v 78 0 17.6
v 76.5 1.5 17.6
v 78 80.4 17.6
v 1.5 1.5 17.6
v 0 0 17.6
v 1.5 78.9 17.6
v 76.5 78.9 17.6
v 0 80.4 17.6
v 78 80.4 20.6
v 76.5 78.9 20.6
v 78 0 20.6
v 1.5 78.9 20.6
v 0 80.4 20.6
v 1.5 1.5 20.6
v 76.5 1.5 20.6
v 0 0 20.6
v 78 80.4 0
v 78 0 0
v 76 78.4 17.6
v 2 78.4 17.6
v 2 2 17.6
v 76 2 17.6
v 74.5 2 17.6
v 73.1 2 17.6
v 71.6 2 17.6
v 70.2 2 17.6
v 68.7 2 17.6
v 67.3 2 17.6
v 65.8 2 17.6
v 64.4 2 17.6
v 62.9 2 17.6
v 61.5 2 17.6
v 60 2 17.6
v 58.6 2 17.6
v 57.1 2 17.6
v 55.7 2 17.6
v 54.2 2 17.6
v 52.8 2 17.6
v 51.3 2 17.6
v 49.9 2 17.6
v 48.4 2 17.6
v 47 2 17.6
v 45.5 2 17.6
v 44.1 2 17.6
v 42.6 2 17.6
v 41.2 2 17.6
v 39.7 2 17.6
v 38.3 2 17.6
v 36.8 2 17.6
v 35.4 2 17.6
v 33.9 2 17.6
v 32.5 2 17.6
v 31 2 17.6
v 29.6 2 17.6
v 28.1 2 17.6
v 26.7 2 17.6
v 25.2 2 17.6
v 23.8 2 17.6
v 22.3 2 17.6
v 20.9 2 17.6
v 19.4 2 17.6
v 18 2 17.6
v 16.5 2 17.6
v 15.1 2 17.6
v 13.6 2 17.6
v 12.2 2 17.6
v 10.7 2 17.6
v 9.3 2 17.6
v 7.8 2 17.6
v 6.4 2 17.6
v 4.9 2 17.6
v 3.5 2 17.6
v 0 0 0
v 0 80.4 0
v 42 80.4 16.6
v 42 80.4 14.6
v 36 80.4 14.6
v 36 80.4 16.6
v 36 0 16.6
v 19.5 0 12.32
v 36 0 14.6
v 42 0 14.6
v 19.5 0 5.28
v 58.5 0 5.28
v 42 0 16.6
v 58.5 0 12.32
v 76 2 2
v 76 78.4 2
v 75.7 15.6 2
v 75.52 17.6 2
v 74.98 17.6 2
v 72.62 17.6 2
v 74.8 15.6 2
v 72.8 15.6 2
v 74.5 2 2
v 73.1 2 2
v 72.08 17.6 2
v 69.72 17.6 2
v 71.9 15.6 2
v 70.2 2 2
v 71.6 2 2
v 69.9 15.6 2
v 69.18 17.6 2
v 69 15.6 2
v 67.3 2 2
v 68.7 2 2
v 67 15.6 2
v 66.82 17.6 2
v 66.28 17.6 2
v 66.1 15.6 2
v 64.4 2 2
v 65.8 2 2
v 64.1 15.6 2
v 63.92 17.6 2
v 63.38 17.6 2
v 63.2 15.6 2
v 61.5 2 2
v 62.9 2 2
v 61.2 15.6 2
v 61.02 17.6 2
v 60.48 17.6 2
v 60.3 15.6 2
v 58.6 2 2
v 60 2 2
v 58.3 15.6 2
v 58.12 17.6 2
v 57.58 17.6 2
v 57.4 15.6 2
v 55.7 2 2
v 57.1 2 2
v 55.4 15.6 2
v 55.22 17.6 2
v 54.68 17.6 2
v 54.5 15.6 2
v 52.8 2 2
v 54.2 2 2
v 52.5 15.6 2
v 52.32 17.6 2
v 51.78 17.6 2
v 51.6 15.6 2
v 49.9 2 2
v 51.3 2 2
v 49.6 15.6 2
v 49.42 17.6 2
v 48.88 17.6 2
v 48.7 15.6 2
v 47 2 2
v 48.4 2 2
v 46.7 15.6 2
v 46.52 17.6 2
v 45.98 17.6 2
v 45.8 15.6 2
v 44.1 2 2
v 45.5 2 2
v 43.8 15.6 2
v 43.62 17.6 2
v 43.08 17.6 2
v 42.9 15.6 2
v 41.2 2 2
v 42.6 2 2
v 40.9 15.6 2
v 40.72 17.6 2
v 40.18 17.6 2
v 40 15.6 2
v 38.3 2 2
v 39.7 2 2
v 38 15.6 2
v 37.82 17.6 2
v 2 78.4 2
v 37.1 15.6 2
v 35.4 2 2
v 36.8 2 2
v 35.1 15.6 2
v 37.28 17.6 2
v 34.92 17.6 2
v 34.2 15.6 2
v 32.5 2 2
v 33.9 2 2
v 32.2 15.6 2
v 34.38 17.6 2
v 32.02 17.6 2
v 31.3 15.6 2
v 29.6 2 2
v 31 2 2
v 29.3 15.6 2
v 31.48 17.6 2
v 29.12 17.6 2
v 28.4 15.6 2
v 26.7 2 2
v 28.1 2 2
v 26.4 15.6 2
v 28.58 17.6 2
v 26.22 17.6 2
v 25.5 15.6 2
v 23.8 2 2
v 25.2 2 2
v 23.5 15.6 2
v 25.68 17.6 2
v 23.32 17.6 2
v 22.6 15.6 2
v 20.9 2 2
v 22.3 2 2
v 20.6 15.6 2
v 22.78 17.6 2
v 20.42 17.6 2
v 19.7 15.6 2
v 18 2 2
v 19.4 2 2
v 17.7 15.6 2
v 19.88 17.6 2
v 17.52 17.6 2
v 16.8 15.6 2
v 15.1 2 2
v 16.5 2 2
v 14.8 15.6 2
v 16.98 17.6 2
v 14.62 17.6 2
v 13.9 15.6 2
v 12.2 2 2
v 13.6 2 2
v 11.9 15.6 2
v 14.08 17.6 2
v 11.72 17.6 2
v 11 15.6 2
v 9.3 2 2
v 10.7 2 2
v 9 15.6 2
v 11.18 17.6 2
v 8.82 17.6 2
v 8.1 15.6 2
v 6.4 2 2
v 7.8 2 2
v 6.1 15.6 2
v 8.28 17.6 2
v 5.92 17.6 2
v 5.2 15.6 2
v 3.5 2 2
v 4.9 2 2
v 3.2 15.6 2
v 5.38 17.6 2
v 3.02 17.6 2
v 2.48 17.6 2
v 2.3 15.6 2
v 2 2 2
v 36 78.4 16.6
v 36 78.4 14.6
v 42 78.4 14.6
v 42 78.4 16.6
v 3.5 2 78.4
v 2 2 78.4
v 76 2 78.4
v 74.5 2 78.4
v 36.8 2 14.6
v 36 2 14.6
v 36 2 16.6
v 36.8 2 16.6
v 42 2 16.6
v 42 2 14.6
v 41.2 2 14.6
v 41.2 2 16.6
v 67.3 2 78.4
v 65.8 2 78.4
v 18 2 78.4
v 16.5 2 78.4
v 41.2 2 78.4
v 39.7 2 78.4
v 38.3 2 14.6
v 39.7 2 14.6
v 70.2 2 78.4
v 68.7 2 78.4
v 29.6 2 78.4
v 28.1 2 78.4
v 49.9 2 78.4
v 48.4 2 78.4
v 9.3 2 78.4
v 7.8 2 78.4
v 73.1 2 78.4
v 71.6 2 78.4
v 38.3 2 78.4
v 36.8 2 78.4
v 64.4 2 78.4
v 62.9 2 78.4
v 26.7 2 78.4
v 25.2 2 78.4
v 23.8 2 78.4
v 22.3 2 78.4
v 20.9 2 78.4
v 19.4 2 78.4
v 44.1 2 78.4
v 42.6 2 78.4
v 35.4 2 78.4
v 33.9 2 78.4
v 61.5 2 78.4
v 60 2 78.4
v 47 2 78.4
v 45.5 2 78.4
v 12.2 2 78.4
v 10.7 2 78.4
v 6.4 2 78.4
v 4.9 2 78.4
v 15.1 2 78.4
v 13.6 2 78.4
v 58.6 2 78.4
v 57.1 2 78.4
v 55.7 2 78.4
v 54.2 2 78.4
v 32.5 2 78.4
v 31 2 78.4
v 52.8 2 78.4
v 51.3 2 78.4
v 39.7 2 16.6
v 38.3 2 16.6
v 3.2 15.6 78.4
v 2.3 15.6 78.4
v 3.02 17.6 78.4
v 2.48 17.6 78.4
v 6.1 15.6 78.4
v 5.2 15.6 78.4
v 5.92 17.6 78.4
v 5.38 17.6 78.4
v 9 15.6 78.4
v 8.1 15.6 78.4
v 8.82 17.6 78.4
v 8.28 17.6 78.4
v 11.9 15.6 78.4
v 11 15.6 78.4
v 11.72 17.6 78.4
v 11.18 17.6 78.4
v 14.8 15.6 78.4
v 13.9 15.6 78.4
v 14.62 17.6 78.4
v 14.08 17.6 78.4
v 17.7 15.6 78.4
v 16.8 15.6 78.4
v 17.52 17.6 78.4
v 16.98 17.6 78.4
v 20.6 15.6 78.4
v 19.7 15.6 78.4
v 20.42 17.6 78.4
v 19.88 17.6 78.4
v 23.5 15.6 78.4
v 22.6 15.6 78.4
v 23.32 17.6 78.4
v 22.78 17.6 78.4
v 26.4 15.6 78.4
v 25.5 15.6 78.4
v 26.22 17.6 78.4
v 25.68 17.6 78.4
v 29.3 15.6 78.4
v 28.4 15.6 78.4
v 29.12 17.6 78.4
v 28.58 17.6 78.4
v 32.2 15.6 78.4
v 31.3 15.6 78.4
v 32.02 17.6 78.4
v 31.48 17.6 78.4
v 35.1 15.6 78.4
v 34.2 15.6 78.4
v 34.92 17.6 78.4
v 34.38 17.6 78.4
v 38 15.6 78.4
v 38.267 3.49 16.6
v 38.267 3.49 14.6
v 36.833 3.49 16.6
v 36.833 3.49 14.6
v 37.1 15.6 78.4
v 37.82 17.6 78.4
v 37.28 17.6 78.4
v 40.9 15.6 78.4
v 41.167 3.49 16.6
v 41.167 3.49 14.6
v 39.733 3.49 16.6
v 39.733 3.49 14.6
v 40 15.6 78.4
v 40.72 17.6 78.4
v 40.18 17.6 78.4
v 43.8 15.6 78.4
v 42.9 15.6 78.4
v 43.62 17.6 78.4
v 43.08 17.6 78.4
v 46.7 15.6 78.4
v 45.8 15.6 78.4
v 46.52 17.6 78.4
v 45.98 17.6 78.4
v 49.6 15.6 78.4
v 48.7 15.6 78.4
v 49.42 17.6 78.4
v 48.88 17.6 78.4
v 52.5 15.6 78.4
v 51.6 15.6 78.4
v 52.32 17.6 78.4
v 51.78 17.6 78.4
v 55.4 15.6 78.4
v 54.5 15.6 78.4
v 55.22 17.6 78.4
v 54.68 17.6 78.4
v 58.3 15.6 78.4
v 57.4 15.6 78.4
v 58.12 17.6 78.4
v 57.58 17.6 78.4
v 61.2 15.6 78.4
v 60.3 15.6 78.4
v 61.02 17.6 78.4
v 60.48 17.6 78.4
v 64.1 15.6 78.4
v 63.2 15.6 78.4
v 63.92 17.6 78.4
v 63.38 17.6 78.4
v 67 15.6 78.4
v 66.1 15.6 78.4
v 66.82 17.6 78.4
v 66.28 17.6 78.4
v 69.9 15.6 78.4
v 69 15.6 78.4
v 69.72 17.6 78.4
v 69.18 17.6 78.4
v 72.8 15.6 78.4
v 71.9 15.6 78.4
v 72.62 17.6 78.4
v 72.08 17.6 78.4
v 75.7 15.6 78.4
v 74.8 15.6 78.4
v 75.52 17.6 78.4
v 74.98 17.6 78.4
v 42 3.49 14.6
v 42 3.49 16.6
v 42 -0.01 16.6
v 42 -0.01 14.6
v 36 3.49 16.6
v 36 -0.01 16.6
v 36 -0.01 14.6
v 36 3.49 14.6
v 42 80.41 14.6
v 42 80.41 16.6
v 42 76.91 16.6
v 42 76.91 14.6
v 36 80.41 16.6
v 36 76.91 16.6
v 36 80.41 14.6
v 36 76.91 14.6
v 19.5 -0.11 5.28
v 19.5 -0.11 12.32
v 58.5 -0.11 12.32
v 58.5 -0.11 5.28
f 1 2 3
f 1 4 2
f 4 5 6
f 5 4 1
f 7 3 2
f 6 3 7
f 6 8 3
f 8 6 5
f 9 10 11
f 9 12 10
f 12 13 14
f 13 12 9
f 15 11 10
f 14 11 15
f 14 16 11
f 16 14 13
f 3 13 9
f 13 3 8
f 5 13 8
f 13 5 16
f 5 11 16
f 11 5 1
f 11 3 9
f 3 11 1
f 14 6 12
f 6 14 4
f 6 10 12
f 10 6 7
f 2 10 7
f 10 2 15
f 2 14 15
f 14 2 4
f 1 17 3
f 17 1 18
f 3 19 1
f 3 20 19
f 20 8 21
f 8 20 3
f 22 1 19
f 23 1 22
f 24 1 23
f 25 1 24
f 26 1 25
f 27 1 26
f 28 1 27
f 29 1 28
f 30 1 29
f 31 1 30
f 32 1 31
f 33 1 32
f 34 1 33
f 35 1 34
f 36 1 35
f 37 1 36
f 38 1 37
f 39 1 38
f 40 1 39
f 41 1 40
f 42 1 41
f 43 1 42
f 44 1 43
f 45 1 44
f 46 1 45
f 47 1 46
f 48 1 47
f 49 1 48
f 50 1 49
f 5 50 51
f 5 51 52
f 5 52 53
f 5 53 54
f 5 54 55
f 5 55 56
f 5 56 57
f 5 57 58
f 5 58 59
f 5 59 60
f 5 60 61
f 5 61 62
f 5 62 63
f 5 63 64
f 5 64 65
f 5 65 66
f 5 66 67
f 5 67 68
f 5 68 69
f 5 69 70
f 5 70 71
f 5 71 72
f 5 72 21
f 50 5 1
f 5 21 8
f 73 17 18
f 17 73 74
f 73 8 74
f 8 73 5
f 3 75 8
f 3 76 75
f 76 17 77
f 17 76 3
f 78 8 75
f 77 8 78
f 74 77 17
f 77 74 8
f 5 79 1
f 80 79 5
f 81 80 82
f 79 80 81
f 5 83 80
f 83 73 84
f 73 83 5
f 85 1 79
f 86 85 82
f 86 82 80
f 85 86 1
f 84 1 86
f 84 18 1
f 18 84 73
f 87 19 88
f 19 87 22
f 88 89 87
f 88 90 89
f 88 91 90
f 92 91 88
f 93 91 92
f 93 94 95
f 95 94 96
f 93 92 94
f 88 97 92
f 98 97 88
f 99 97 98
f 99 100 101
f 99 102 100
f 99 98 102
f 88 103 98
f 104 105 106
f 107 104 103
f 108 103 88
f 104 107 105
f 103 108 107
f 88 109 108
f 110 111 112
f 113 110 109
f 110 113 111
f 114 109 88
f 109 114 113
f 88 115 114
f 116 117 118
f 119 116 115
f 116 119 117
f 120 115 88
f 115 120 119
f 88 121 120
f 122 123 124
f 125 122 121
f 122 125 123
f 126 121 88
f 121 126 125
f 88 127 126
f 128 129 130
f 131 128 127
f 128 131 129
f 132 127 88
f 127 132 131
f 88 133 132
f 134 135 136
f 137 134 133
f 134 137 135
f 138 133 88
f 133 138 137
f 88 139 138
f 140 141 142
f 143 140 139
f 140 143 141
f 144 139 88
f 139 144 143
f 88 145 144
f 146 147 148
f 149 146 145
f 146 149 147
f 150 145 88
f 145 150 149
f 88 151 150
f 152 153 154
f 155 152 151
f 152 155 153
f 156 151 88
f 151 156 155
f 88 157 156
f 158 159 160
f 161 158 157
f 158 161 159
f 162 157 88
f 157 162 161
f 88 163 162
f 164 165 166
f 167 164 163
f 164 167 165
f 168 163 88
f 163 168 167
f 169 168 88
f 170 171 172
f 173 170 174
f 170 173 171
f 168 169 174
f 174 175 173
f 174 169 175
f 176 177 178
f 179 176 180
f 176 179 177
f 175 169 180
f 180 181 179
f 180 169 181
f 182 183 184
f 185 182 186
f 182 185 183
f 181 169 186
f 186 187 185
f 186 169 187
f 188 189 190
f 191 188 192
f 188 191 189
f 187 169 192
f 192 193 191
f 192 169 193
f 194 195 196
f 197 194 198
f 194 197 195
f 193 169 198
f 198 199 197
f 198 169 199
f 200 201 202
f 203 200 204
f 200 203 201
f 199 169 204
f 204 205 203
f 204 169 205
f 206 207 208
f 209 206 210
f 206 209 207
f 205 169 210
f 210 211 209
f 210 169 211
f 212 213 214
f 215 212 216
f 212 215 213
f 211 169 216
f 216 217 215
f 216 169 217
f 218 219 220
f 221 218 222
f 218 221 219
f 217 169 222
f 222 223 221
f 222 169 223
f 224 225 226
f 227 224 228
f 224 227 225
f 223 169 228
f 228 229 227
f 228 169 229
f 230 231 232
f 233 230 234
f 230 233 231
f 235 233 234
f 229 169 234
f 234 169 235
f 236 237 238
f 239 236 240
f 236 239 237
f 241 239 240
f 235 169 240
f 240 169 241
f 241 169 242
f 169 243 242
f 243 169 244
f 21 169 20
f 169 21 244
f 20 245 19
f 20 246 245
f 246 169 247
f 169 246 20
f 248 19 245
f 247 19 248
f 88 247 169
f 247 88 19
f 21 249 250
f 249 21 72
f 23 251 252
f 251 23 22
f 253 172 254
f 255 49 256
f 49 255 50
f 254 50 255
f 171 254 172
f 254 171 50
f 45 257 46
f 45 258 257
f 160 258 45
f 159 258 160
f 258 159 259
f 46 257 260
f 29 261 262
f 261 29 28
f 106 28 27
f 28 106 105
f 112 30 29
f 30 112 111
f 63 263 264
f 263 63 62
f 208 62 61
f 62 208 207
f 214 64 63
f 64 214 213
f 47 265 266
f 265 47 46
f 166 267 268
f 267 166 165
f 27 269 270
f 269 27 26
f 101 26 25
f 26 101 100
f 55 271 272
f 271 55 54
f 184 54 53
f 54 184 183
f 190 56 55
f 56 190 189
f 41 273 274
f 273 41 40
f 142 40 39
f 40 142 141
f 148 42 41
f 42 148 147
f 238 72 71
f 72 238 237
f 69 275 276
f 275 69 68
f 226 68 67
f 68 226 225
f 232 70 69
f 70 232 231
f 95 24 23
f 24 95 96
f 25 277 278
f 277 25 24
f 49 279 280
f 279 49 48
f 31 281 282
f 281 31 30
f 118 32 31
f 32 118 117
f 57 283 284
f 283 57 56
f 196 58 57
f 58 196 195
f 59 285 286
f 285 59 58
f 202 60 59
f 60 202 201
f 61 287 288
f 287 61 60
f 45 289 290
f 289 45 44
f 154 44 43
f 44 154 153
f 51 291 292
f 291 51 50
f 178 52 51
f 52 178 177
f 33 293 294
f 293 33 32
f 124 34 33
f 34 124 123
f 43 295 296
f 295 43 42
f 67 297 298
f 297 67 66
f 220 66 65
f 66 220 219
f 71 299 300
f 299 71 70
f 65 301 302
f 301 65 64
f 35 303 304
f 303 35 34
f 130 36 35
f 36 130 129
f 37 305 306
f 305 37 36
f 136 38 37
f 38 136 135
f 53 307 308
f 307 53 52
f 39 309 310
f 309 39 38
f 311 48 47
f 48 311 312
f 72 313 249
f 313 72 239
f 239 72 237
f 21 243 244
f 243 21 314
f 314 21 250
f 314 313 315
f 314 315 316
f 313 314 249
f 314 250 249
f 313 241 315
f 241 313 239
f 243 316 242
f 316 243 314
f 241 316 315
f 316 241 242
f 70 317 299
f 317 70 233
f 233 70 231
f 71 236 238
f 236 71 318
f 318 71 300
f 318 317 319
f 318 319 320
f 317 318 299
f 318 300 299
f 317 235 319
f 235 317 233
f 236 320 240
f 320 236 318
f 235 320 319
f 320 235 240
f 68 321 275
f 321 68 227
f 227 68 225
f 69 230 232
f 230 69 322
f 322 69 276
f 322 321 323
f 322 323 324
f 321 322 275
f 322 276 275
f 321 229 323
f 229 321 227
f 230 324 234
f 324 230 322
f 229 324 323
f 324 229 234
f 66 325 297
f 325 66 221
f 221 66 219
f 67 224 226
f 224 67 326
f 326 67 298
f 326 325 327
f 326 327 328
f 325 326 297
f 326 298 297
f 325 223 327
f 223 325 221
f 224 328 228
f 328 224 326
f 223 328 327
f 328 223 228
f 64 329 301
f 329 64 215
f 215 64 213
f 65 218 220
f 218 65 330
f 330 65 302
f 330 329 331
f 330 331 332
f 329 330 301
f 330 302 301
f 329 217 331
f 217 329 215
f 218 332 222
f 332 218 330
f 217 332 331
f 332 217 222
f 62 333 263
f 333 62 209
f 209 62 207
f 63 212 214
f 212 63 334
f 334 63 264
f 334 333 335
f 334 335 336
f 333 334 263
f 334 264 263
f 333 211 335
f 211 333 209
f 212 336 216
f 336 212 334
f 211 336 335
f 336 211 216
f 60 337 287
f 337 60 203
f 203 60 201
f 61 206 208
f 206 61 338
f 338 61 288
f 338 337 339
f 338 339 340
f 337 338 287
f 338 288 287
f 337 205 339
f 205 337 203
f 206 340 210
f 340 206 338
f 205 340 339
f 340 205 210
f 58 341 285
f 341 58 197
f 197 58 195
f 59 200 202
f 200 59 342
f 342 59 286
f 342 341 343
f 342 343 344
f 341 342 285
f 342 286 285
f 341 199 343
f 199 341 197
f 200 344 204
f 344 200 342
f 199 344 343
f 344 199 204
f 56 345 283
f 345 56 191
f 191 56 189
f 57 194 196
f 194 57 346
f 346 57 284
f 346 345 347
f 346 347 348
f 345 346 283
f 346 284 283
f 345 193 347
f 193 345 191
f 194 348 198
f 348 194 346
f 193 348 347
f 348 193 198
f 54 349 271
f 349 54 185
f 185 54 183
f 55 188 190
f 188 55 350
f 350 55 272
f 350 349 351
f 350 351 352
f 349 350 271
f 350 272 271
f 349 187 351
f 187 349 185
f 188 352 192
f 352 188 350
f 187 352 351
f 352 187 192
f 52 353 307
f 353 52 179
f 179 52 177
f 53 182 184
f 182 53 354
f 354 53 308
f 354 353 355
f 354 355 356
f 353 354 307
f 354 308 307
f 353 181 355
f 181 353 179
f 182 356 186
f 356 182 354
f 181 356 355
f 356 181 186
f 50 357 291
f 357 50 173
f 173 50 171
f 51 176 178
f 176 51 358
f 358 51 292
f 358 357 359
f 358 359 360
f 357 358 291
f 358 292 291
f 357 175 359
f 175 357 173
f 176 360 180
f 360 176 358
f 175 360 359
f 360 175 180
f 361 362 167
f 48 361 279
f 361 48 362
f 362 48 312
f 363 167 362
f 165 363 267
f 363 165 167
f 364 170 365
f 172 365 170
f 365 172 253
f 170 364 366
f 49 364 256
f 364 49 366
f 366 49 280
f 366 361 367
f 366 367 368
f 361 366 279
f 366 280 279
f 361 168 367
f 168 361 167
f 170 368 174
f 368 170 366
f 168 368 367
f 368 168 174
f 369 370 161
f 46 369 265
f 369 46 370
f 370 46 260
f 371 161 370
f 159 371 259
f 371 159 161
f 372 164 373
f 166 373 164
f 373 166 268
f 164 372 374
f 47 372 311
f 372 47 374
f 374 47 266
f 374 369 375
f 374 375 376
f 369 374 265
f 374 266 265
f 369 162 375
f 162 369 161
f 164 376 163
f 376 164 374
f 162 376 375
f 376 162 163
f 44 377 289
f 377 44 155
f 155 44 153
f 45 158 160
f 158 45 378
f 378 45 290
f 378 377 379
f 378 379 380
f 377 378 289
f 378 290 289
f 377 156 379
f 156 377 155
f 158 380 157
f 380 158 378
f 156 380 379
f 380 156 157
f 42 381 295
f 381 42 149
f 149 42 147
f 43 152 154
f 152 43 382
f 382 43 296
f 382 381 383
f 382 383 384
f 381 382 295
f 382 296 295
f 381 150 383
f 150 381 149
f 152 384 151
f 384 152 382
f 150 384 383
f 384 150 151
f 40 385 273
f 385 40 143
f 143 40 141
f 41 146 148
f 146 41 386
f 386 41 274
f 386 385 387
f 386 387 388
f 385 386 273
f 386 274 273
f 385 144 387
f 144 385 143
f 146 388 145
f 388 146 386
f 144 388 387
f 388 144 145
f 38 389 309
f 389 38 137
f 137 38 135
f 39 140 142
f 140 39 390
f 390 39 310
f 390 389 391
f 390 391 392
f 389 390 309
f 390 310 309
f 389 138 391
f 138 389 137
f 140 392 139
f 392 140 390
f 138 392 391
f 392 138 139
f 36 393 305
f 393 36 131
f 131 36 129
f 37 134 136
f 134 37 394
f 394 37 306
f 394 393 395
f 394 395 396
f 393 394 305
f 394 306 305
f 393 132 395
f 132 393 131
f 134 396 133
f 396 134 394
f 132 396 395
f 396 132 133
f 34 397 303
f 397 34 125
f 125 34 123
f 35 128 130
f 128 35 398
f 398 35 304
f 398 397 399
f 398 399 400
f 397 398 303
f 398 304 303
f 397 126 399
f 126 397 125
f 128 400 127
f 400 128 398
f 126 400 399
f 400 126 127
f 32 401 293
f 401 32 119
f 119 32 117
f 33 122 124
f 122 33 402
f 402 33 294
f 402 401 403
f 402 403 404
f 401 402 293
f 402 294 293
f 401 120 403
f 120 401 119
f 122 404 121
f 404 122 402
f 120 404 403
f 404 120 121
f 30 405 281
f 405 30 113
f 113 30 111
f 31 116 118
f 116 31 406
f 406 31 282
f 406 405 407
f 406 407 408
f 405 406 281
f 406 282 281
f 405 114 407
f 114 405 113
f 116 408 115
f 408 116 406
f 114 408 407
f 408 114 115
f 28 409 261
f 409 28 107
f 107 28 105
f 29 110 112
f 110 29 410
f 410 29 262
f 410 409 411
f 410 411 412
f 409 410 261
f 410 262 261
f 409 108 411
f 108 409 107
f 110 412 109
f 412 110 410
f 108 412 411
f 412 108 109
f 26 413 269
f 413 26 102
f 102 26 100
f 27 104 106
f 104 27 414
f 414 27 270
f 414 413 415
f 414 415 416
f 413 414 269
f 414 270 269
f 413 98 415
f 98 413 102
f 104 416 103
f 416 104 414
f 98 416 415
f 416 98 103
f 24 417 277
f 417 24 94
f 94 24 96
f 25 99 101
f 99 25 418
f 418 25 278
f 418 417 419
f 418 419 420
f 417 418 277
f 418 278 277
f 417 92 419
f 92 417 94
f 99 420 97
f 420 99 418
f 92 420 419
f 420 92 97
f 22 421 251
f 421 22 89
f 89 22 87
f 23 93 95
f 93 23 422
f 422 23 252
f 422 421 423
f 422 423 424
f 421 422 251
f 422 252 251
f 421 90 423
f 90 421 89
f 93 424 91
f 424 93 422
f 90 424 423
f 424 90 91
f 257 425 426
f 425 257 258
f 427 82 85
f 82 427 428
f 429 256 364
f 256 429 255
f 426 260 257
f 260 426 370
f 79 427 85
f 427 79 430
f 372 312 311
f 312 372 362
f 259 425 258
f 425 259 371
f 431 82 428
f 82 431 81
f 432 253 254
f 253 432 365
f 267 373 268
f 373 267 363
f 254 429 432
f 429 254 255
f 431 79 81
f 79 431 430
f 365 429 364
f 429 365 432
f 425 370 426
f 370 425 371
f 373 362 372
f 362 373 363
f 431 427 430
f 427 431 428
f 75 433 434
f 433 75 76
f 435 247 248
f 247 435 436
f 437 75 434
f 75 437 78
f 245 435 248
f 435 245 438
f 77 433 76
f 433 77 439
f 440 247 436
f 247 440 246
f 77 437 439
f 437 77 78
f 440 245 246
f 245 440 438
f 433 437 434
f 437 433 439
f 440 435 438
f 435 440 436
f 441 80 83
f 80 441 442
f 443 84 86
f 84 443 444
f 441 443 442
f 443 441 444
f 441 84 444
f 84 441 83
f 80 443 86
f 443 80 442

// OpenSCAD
// ============================================================================
// box.scad — Class II: Vertical Slotted Storage Box
// ============================================================================
// Reference: docs/RESEARCH.pdf §5 (Vertical Slotted Systems)
//
// The classic "25-place" / "100-place" slide box. Slides stand vertically in
// parallel slots formed by tapered ribs with chamfered lead-ins.
//
// Parts:
//   render_mode 0 → box_base   (slotted trough + optional stacking lip)
//   render_mode 1 → box_lid    (snap-fit lid + optional stacking groove)
// ============================================================================

use <slide_lib.scad>

// ---------------------------------------------------------------------------
// Parameters (injected by platform via -D)
// ---------------------------------------------------------------------------

// --- Slide Standard ---
slide_standard = 0;       // 0=ISO, 1=US, 2=Petrographic, 3=Supa Mega, 4=Custom
custom_slide_length = 76;
custom_slide_width = 26;
custom_slide_thickness = 1.0;

// --- Architecture ---
num_slots = 25;            // Number of slide positions
density = 1;               // 0=archival, 1=working, 2=staining, 3=mailer

// --- Tolerances ---
tolerance_xy = 0.4;        // XY clearance (mm)
tolerance_z = 0.2;         // Z / thickness clearance (mm)

// --- Structure ---
wall_thickness = 2.0;      // Outer wall thickness (mm)
floor_thickness = 2.0;     // Base floor thickness (mm)

// --- Box-specific ---
rib_profile = 0;           // 0=tapered, 1=rectangular
rib_width = 1.5;           // Rib root width (mm)
lid_latch = 0;             // 0=snap, 1=magnetic, 2=none
stackable = 1;             // 1=generate stacking lip/groove
numbering_start = 1;       // First slot number for debossed labels

// --- Features ---
label_area = 1;            // 1=generate debossed label recess

// --- Quality ---
fn = 0;                    // Resolution ($fn), 0 = auto

// --- Mode ---
render_mode = 0;           // 0=box_base, 1=box_lid

// ---------------------------------------------------------------------------
// Resolution
// ---------------------------------------------------------------------------
$fn = fn > 0 ? fn : 32;

// ---------------------------------------------------------------------------
// Resolve Slide Dimensions
// ---------------------------------------------------------------------------
_slide = resolve_slide(slide_standard, custom_slide_length,
                       custom_slide_width, custom_slide_thickness);
_sl = _slide[0];   // slide length
_sw = _slide[1];   // slide width
_st = _slide[2];   // slide thickness

// ---------------------------------------------------------------------------
// Derived Dimensions (RESEARCH §5.1.2, §8.2)
// ---------------------------------------------------------------------------
_rib_w = rib_width;
_rib_tip_w = rib_profile == 0 ? _rib_w * 0.6 : _rib_w;
_slot_w = slot_width(_st, tolerance_z);
_pitch = pitch(_slot_w, _rib_w);

// Rib / slot height: slides sit in slots up to half their width
_slot_depth = _sw * 0.6;
_rib_height = _slot_depth;
_chamfer_h = rib_profile == 0 ? min(2.0, _rib_height * 0.15) : 0;

// Body envelope
_body_x = (num_slots * _pitch) + _rib_w + (2 * wall_thickness);
_body_y = _sl + (2 * wall_thickness) + tolerance_xy;
_body_z = _rib_height + floor_thickness;

// Lid dimensions
_lid_clearance = 0.3;
_lid_wall = 1.5;
_lid_z = 8;   // lid height

// Snap latch (RESEARCH §5.3)
_latch_arm_len = 15;    // PLA yield-safe minimum
_latch_arm_w = 6;
_latch_arm_t = 1.2;
_latch_hook_h = 2;
_latch_hook_d = 1.5;

// Stacking lip (RESEARCH §4.4)
_lip_h = 3;
_lip_w = 1.5;

// ---------------------------------------------------------------------------
// box_base — Slotted trough with ribs
// ---------------------------------------------------------------------------
module box_base() {
    difference() {
        union() {
            // Outer shell
            cube([_body_x, _body_y, _body_z]);

            // Stacking lip on top perimeter
            if (stackable == 1) {
                translate([0, 0, _body_z])
                    stacking_lip(_body_x, _body_y, _lip_h, _lip_w);
            }
        }

        // Hollow interior
        translate([wall_thickness, wall_thickness, floor_thickness])
            cube([
                _body_x - 2 * wall_thickness,
                _body_y - 2 * wall_thickness,
                _rib_height + 1  // cut above rib height
            ]);
    }

    // Rib array inside the box
    translate([wall_thickness, wall_thickness, floor_thickness]) {
        _tapered = rib_profile == 0 ? true : false;
        // Rotate ribs so they extrude along Y (slide length direction)
        rotate([0, 0, 0])
            slot_array(
                count = num_slots,
                pitch = _pitch,
                height = _rib_height,
                depth = _body_y - 2 * wall_thickness,
                root_w = _rib_w,
                tip_w = _rib_tip_w,
                chamfer_h = _chamfer_h,
                tapered = _tapered
            );
    }

    // Snap latch catches on base (one per long side)
    if (lid_latch == 0) {
        // Front catch
        translate([_body_x / 2 - _latch_arm_w / 2, -0.01, _body_z - _latch_hook_h - 1])
            snap_latch_catch(_latch_arm_w, _latch_hook_h, wall_thickness + _latch_hook_d);

        // Back catch
        translate([_body_x / 2 - _latch_arm_w / 2, _body_y - wall_thickness - _latch_hook_d + 0.01, _body_z - _latch_hook_h - 1])
            snap_latch_catch(_latch_arm_w, _latch_hook_h, wall_thickness + _latch_hook_d);
    }

    // Label recess on front face
    if (label_area == 1) {
        _label_w = min(40, _body_x * 0.5);
        _label_h = min(12, _body_z * 0.4);
        translate([(_body_x - _label_w) / 2, -0.01, (_body_z - _label_h) / 2])
            rotate([90, 0, 0])
                translate([0, 0, -0.4])
                    label_recess(_label_w, _label_h, 0.5);
    }

    // Debossed slot numbers (suppress when fn=0 for draft speed)
    if (numbering_start >= 0 && fn > 0) {
        for (i = [0 : num_slots - 1]) {
            _num = numbering_start + i;
            _x = wall_thickness + (i * _pitch) + _pitch / 2;
            translate([_x, _body_y - 0.01, floor_thickness + 2])
                rotate([90, 0, 0])
                    linear_extrude(height = 0.5)
                        text(str(_num), size = min(3, _pitch * 0.7),
                             halign = "center", valign = "bottom",
                             font = "Liberation Sans:style=Bold");
        }
    }
}

// ---------------------------------------------------------------------------
// box_lid — Snap-fit lid
// ---------------------------------------------------------------------------
module box_lid() {
    _inner_x = _body_x + _lid_clearance * 2;
    _inner_y = _body_y + _lid_clearance * 2;
    _outer_x = _inner_x + _lid_wall * 2;
    _outer_y = _inner_y + _lid_wall * 2;

    difference() {
        // Outer lid shell
        cube([_outer_x, _outer_y, _lid_z]);

        // Hollow interior (slides over base top)
        translate([_lid_wall, _lid_wall, 1.5])
            cube([_inner_x, _inner_y, _lid_z]);

        // Stacking groove on top (if stackable)
        if (stackable == 1) {
            translate([_lid_wall - _lip_w - 0.1,
                       _lid_wall - _lip_w - 0.1,
                       _lid_z - 3.2])
                stacking_groove(_inner_x + (_lip_w + 0.1) * 2,
                                _inner_y + (_lip_w + 0.1) * 2,
                                3.2, _lip_w + 0.2);
        }
    }

    // Snap latch arms (one per long side)
    if (lid_latch == 0) {
        // Front arm
        translate([_outer_x / 2 - _latch_arm_w / 2, 0, _lid_z])
            rotate([0, 0, 0])
                mirror([0, 0, 1])
                    snap_latch_arm(_latch_arm_len, _latch_arm_w,
                                   _latch_arm_t, _latch_hook_h, _latch_hook_d);

        // Back arm
        translate([_outer_x / 2 - _latch_arm_w / 2, _outer_y - _latch_arm_t, _lid_z])
            rotate([0, 0, 0])
                mirror([0, 0, 1])
                    snap_latch_arm(_latch_arm_len, _latch_arm_w,
                                   _latch_arm_t, _latch_hook_h, _latch_hook_d);
    }

    // Label recess on lid top
    if (label_area == 1) {
        _label_w = min(50, _outer_x * 0.6);
        _label_h = min(20, _outer_y * 0.3);
        translate([(_outer_x - _label_w) / 2, (_outer_y - _label_h) / 2, _lid_z - 0.39])
            label_recess(_label_w, _label_h, 0.4);
    }
}

// ---------------------------------------------------------------------------
// Render Mode Dispatch
// ---------------------------------------------------------------------------
if (render_mode == 0) {
    box_base();
}

if (render_mode == 1) {
    box_lid();
}
